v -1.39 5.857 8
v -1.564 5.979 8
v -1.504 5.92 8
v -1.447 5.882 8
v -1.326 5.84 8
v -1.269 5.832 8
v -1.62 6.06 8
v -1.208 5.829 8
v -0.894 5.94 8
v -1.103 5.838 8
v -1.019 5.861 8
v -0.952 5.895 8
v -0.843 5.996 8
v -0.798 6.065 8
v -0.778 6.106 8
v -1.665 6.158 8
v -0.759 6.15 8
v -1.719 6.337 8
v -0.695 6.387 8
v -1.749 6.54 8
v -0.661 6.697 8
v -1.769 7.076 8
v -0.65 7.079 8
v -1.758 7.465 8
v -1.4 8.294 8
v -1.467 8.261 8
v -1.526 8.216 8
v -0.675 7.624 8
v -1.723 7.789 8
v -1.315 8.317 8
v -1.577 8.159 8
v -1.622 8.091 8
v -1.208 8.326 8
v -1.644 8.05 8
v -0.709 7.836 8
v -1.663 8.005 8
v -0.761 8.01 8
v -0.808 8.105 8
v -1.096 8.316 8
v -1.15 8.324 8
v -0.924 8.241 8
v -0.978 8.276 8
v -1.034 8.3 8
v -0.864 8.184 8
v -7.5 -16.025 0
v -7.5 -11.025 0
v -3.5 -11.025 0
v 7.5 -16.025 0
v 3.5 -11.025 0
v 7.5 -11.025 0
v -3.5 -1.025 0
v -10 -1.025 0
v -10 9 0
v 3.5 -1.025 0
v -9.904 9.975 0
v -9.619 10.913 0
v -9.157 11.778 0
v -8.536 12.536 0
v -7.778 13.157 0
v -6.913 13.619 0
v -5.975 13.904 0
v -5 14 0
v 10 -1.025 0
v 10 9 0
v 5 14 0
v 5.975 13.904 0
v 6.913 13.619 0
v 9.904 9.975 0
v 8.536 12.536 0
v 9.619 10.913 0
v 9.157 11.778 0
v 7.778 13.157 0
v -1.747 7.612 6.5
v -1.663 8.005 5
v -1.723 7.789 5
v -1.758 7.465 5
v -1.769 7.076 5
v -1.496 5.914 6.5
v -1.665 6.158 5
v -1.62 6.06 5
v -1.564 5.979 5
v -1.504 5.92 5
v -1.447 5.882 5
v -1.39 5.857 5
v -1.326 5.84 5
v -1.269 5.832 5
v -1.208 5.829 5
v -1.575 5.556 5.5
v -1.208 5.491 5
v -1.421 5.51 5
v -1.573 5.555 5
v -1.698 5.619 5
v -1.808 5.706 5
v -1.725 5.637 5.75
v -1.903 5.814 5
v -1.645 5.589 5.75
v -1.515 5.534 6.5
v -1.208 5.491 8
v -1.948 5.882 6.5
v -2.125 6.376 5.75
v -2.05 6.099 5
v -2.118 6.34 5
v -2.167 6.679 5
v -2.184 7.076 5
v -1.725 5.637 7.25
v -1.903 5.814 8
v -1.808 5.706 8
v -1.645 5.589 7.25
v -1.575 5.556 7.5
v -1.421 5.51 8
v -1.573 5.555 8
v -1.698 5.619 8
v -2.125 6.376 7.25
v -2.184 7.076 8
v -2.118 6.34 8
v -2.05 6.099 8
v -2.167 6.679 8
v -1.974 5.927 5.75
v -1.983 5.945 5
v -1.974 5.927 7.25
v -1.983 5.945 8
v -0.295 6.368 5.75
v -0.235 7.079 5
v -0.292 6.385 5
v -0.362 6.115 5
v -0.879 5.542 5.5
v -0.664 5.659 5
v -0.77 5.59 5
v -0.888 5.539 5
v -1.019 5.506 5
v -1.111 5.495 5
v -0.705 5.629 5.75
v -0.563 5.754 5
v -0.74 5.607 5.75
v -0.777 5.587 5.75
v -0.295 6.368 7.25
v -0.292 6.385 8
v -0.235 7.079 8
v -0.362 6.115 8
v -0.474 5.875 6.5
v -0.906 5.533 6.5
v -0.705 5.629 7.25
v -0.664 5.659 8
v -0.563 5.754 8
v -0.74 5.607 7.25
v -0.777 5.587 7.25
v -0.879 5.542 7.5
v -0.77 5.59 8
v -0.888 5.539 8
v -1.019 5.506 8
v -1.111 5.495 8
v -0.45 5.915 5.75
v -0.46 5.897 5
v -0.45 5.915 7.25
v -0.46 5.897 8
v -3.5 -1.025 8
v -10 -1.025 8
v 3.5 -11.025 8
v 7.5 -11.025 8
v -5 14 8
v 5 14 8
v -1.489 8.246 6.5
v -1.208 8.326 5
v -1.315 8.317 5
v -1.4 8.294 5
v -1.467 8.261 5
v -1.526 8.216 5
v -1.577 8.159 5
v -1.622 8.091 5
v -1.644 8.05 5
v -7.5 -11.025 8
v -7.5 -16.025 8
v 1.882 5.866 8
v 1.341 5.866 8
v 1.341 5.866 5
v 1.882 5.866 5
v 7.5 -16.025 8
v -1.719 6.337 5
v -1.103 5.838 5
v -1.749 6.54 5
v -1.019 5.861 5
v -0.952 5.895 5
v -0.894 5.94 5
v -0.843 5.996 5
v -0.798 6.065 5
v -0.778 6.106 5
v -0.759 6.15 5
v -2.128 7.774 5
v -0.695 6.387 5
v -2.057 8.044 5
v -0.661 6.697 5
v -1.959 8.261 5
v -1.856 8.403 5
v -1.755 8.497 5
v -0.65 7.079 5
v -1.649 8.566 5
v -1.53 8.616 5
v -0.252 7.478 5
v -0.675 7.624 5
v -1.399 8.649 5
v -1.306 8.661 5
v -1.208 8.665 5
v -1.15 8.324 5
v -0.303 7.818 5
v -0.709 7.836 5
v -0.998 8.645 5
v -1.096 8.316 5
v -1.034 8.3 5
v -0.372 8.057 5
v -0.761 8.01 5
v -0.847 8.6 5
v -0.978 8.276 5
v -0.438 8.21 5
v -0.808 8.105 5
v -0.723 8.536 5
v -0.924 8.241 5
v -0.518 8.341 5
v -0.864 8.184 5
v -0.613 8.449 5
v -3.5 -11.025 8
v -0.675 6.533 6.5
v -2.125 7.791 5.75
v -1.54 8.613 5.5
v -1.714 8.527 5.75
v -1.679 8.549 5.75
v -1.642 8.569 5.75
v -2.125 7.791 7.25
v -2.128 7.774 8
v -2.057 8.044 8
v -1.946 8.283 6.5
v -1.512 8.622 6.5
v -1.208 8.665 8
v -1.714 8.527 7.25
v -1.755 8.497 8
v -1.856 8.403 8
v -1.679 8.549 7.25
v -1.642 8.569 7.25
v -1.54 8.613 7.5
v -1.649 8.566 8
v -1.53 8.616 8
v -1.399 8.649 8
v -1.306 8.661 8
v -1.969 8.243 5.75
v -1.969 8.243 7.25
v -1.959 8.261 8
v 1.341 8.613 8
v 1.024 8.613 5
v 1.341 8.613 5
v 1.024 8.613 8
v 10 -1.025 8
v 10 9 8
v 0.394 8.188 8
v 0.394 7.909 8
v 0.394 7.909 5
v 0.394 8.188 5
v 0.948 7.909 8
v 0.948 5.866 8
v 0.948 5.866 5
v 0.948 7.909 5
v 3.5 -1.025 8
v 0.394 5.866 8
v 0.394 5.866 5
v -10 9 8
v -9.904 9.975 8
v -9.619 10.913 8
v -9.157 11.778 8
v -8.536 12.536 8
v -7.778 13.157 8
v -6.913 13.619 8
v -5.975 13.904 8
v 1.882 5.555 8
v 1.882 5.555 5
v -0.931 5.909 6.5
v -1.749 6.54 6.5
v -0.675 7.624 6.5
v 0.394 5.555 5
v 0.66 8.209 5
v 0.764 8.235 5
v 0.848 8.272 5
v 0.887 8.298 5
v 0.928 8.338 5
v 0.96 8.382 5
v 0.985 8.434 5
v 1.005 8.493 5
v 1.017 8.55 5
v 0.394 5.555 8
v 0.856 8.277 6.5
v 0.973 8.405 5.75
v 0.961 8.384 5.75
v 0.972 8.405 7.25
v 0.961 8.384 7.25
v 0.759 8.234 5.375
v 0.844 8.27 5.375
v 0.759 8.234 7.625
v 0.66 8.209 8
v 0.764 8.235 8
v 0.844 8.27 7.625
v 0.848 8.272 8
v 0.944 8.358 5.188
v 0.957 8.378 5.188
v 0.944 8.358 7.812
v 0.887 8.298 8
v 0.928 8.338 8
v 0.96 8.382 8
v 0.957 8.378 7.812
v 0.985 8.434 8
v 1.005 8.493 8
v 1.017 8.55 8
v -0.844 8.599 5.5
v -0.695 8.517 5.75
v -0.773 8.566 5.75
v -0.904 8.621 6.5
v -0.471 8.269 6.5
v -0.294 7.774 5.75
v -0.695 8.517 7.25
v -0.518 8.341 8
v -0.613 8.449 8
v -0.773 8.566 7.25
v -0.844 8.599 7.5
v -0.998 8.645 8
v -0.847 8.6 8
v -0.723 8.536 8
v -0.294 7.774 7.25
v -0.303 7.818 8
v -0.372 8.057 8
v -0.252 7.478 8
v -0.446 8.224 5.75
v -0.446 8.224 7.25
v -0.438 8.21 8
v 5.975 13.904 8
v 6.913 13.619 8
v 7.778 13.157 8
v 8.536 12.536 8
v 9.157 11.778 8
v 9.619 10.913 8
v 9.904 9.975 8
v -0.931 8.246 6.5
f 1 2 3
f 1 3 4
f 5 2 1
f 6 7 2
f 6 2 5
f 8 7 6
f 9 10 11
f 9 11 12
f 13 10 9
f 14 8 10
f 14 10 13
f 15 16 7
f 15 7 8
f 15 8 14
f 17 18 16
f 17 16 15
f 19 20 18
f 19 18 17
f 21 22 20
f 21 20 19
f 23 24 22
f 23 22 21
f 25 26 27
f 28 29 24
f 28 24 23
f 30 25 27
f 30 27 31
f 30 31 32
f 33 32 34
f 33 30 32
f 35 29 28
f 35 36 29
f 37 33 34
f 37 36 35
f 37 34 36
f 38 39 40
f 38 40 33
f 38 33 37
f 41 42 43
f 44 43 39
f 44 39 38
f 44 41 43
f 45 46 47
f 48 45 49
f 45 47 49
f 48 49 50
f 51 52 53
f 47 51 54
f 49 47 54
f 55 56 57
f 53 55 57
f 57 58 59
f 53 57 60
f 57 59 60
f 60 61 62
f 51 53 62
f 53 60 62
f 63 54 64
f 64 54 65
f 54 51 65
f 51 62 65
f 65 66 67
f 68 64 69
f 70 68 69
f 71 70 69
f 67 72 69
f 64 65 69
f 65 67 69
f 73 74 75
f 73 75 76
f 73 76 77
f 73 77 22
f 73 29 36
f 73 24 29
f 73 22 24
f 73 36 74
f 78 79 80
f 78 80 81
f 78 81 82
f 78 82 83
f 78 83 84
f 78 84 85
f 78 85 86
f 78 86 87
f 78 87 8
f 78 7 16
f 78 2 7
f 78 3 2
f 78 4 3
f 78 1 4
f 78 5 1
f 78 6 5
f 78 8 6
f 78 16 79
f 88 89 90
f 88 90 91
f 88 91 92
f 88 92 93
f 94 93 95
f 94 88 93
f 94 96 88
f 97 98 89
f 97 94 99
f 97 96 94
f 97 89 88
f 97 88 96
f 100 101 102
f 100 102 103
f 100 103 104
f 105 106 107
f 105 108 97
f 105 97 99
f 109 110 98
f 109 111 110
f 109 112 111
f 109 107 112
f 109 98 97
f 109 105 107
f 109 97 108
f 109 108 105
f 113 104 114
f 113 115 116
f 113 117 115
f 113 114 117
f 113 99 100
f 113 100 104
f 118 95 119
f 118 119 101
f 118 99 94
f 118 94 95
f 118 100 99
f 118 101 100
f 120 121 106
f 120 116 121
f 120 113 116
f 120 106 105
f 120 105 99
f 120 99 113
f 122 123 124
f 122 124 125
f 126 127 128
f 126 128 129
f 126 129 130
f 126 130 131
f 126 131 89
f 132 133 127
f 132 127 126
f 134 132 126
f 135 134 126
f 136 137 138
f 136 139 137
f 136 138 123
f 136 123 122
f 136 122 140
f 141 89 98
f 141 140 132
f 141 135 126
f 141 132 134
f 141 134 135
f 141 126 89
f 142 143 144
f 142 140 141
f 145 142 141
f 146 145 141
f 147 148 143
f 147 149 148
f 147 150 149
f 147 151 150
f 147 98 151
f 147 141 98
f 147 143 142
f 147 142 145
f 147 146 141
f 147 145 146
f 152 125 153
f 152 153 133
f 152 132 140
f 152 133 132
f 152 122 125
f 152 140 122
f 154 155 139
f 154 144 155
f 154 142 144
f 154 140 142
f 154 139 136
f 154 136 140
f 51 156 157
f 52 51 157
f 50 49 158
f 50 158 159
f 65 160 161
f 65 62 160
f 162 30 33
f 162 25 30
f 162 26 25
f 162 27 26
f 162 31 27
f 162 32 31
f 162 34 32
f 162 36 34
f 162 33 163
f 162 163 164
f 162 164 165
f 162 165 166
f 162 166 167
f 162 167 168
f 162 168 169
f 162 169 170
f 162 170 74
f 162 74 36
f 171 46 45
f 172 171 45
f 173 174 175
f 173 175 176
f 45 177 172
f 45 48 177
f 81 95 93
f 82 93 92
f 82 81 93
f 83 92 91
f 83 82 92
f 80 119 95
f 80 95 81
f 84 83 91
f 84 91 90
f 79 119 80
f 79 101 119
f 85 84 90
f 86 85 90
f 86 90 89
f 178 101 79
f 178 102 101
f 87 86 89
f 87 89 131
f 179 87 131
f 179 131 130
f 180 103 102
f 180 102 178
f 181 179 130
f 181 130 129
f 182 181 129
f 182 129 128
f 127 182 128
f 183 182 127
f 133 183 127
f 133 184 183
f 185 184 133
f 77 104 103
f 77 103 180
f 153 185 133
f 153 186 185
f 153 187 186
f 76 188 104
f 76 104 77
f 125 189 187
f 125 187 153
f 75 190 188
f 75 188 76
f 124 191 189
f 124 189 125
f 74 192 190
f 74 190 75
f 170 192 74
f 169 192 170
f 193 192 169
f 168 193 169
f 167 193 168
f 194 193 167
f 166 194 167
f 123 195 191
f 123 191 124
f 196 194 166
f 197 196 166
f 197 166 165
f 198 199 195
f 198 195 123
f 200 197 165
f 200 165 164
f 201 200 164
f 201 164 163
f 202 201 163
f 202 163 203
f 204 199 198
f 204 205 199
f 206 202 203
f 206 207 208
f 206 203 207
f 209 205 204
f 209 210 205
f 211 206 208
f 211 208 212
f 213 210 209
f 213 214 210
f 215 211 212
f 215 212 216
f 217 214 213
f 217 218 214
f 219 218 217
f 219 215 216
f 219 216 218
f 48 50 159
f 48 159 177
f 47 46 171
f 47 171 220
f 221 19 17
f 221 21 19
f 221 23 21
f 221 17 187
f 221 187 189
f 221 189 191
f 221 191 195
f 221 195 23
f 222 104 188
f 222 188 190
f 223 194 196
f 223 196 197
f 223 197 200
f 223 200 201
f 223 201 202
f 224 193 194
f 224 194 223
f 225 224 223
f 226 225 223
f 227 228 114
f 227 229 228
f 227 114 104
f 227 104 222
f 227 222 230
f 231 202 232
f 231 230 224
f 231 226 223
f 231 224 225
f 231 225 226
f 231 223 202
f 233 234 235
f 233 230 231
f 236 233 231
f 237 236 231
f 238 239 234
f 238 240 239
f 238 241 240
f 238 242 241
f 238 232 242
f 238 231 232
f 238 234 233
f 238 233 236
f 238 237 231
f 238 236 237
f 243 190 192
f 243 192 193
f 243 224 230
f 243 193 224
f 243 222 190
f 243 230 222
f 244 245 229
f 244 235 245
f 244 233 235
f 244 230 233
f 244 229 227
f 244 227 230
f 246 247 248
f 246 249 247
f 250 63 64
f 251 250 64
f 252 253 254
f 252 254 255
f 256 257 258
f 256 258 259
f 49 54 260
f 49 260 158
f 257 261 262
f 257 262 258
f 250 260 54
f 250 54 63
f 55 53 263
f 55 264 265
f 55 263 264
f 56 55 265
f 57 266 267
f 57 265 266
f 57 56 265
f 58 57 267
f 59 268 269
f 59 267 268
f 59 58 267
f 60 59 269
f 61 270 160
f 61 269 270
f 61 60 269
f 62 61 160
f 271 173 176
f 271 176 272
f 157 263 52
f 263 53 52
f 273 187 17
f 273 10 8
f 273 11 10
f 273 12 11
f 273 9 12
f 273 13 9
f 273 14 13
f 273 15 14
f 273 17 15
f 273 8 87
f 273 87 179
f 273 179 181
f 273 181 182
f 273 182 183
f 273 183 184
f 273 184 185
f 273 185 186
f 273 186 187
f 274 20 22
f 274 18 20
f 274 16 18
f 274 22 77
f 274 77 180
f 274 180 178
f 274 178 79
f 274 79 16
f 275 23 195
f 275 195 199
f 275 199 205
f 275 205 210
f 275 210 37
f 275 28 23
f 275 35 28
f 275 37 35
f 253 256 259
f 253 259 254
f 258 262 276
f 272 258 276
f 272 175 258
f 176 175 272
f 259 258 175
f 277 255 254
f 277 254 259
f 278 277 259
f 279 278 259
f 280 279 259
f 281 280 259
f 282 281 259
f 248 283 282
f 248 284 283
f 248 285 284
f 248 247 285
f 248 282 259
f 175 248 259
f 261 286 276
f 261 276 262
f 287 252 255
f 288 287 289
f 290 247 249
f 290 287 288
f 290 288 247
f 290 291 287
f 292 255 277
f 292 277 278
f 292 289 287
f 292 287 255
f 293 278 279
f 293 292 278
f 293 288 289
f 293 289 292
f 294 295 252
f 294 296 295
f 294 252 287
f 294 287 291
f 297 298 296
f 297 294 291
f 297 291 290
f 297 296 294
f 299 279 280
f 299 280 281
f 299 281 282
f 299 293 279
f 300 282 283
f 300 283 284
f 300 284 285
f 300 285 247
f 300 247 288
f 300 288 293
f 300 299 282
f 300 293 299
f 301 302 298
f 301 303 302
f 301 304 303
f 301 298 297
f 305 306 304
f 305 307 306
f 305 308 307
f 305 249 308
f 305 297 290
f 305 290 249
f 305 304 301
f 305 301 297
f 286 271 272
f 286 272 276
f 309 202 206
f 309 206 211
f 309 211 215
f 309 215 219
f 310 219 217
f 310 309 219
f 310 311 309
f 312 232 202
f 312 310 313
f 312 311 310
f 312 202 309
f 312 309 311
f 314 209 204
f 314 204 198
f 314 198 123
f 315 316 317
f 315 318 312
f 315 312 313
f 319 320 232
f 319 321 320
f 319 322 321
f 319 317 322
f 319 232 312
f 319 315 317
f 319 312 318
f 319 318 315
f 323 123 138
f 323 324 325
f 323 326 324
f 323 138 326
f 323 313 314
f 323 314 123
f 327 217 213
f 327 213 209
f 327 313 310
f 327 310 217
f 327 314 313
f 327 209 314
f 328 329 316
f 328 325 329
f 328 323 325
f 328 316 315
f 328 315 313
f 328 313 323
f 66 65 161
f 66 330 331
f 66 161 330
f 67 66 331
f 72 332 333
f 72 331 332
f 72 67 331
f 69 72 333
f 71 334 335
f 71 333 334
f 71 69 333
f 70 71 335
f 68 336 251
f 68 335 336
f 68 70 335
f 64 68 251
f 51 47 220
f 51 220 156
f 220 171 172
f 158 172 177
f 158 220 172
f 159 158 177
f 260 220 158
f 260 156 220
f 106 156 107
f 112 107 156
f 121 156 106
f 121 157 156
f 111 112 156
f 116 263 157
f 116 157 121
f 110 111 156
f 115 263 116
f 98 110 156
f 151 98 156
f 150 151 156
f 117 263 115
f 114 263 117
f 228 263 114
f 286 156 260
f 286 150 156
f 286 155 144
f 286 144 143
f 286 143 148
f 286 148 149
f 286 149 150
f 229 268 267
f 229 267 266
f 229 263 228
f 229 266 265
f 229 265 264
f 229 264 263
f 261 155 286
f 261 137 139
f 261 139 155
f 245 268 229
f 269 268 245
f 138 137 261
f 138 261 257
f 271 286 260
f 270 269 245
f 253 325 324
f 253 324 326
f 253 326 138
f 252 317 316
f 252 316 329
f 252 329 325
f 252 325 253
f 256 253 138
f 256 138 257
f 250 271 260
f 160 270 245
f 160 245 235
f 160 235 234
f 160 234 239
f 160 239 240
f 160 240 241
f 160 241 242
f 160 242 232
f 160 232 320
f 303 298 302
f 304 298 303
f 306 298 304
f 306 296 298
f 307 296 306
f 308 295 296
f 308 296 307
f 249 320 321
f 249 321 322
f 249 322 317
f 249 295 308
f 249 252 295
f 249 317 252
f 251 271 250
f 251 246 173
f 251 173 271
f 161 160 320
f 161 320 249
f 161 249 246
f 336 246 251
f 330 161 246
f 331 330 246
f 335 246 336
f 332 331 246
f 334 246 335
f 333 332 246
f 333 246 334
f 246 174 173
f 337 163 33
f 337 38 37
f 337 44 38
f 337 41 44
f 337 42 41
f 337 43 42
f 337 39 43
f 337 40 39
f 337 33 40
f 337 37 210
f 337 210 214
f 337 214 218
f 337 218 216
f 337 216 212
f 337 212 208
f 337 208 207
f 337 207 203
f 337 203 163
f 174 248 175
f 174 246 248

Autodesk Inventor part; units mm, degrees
ref_plane "YZ Plane" through (0, 0, 0) normal (1, 0, 0) x (0, 1, 0)
ref_plane "XZ Plane" through (0, 0, 0) normal (0, 1, 0) x (-1, 0, 0)
ref_plane "XY Plane" through (0, 0, 0) normal (0, 0, 1) x (1, 0, 0)
sketch "스케치1" plane through (0, 0, 0) normal (0, 0, 1) x (1, 0, 0)
  line L0 (-5, 14) -> (5, 14)
  line L1 (7.5, -16.0251) -> (-7.5, -16.0251)
  line L2 (-7.5, -11.0251) -> (-7.5, -16.0251)
  line L3 (3.5, -1.0251) -> (3.5, -11.0251)
  line L4 (-3.5, -11.0251) -> (-3.5, -1.0251)
  line L5 (7.5, -11.0251) -> (7.5, -16.0251)
  line L6 (-3.5, -1.0251) -> (-10, -1.0251)
  line L7 (-3.5, -1.0251) -> (3, -1.0251) construction
  line L8 (3.5, -1.0251) -> (10, -1.0251)
  line L9 (3.5, -1.0251) -> (10, -1.0251) construction
  line L10 (-10, 9) -> (-10, -1.0251)
  line L11 (10, -1.0251) -> (10, 9)
  line L12 (-7.5, -11.0251) -> (-3.5, -11.0251)
  line L13 (3.5, -11.0251) -> (7.5, -11.0251)
  arc A0 (-5, 14) -> (-10, 9) centre (-5, 9) ccw
  arc A1 (10, 9) -> (5, 14) centre (5, 9) ccw
  point P0 (0, 0)
  point P1 (-10, 14)
  point P2 (10, 14)
  dimension "d2" = 20
  dimension "d5" = 15
  dimension "d7" = 7.5
  dimension "d12" = 7
  dimension "d13" = 3.5
  dimension "d14" = 180
  dimension "d15" = 0
  dimension "d16" = 5
  dimension "d17" = 5
  dimension "d18" = 10
sketch "스케치2" plane through (0, 0, 0) normal (0, 0, 1) x (1, 0, 0)
  line L0 (10, -1) -> (3.4836, -1)
  point P0 (0, 0)
sketch "스케치3" plane through (0, 0, 0) normal (0, 0, 1) x (1, 0, 0)
  point P0 (0, 0)
extrude "돌출1" add sketch "스케치1" along normal blind 8
sketch "스케치4" plane through (0, 0, 8) normal (0, 0, 1) x (1, 0, 0)
  line L0 (-2.3546, 8.6646) -> (2.2199, 8.6646) construction
  line L1 (2.2199, 8.6646) -> (2.2199, 5.4907) construction
  line L2 (2.2199, 5.4907) -> (-2.3546, 5.4907) construction
  line L3 (-2.3546, 5.4907) -> (-2.3546, 8.6646) construction
  spline S0 degree 2 poles (-0.2353, 7.0789) (-0.2353, 6.2588) (-0.712, 5.4907) (-1.2085, 5.4907) knots 0 0 0 1 2 2 2
  spline S1 degree 2 poles (-1.2085, 5.4907) (-1.7124, 5.4907) (-2.1841, 6.2737) (-2.1841, 7.0764) knots 0 0 0 1 2 2 2
  spline S2 degree 2 poles (-2.1841, 7.0764) (-2.1841, 7.9014) (-1.7074, 8.6646) (-1.2085, 8.6646) knots 0 0 0 1 2 2 2
  spline S3 degree 2 poles (-1.2085, 8.6646) (-0.7071, 8.6646) (-0.2353, 7.8742) (-0.2353, 7.0789) knots 0 0 0 1 2 2 2
  spline S4 degree 2 poles (-0.7589, 6.1502) (-0.6997, 6.3008) (-0.6503, 6.7652) (-0.6503, 7.0789) knots 0 0 0 1 2 2 2
  spline S5 degree 2 poles (-0.6503, 7.0789) (-0.6503, 7.3926) (-0.6997, 7.8545) (-0.7614, 8.0101) knots 0 0 0 1 2 2 2
  spline S6 degree 2 poles (-0.7614, 8.0101) (-0.8232, 8.1657) (-1.0381, 8.3263) (-1.2085, 8.3263) knots 0 0 0 1 2 2 2
  spline S7 degree 2 poles (-1.2085, 8.3263) (-1.3789, 8.3263) (-1.5988, 8.1657) (-1.663, 8.0052) knots 0 0 0 1 2 2 2
  spline S8 degree 2 poles (-1.663, 8.0052) (-1.7247, 7.8495) (-1.7692, 7.3753) (-1.7692, 7.0764) knots 0 0 0 1 2 2 2
  spline S9 degree 2 poles (-1.7692, 7.0764) (-1.7692, 6.7553) (-1.7297, 6.3255) (-1.6654, 6.1576) knots 0 0 0 1 2 2 2
  spline S10 degree 2 poles (-1.6654, 6.1576) (-1.6062, 5.9995) (-1.3863, 5.8291) (-1.2085, 5.8291) knots 0 0 0 1 2 2 2
  spline S11 degree 2 poles (-1.2085, 5.8291) (-1.0405, 5.8291) (-0.8207, 5.9896) (-0.7589, 6.1502) knots 0 0 0 1 2 2 2
  line L4 (1.8815, 5.5549) -> (0.3945, 5.5549)
  line L5 (0.3945, 5.5549) -> (0.3945, 5.8661)
  line L6 (0.3945, 5.8661) -> (0.9478, 5.8661)
  line L7 (0.9478, 5.8661) -> (0.9478, 7.9088)
  line L8 (0.9478, 7.9088) -> (0.3945, 7.9088)
  line L9 (0.3945, 7.9088) -> (0.3945, 8.1879)
  spline S12 degree 2 poles (0.3945, 8.1879) (0.7082, 8.1879) (1.0046, 8.3658) (1.0244, 8.6128) knots 0 0 0 1 2 2 2
  line L10 (1.0244, 8.6128) -> (1.3406, 8.6128)
  line L11 (1.3406, 8.6128) -> (1.3406, 5.8661)
  line L12 (1.3406, 5.8661) -> (1.8815, 5.8661)
  line L13 (1.8815, 5.8661) -> (1.8815, 5.5549)
  point P0 (0, 0)
extrude "돌출2" cut sketch "스케치4" against normal blind 3
properties part number "01_02"
